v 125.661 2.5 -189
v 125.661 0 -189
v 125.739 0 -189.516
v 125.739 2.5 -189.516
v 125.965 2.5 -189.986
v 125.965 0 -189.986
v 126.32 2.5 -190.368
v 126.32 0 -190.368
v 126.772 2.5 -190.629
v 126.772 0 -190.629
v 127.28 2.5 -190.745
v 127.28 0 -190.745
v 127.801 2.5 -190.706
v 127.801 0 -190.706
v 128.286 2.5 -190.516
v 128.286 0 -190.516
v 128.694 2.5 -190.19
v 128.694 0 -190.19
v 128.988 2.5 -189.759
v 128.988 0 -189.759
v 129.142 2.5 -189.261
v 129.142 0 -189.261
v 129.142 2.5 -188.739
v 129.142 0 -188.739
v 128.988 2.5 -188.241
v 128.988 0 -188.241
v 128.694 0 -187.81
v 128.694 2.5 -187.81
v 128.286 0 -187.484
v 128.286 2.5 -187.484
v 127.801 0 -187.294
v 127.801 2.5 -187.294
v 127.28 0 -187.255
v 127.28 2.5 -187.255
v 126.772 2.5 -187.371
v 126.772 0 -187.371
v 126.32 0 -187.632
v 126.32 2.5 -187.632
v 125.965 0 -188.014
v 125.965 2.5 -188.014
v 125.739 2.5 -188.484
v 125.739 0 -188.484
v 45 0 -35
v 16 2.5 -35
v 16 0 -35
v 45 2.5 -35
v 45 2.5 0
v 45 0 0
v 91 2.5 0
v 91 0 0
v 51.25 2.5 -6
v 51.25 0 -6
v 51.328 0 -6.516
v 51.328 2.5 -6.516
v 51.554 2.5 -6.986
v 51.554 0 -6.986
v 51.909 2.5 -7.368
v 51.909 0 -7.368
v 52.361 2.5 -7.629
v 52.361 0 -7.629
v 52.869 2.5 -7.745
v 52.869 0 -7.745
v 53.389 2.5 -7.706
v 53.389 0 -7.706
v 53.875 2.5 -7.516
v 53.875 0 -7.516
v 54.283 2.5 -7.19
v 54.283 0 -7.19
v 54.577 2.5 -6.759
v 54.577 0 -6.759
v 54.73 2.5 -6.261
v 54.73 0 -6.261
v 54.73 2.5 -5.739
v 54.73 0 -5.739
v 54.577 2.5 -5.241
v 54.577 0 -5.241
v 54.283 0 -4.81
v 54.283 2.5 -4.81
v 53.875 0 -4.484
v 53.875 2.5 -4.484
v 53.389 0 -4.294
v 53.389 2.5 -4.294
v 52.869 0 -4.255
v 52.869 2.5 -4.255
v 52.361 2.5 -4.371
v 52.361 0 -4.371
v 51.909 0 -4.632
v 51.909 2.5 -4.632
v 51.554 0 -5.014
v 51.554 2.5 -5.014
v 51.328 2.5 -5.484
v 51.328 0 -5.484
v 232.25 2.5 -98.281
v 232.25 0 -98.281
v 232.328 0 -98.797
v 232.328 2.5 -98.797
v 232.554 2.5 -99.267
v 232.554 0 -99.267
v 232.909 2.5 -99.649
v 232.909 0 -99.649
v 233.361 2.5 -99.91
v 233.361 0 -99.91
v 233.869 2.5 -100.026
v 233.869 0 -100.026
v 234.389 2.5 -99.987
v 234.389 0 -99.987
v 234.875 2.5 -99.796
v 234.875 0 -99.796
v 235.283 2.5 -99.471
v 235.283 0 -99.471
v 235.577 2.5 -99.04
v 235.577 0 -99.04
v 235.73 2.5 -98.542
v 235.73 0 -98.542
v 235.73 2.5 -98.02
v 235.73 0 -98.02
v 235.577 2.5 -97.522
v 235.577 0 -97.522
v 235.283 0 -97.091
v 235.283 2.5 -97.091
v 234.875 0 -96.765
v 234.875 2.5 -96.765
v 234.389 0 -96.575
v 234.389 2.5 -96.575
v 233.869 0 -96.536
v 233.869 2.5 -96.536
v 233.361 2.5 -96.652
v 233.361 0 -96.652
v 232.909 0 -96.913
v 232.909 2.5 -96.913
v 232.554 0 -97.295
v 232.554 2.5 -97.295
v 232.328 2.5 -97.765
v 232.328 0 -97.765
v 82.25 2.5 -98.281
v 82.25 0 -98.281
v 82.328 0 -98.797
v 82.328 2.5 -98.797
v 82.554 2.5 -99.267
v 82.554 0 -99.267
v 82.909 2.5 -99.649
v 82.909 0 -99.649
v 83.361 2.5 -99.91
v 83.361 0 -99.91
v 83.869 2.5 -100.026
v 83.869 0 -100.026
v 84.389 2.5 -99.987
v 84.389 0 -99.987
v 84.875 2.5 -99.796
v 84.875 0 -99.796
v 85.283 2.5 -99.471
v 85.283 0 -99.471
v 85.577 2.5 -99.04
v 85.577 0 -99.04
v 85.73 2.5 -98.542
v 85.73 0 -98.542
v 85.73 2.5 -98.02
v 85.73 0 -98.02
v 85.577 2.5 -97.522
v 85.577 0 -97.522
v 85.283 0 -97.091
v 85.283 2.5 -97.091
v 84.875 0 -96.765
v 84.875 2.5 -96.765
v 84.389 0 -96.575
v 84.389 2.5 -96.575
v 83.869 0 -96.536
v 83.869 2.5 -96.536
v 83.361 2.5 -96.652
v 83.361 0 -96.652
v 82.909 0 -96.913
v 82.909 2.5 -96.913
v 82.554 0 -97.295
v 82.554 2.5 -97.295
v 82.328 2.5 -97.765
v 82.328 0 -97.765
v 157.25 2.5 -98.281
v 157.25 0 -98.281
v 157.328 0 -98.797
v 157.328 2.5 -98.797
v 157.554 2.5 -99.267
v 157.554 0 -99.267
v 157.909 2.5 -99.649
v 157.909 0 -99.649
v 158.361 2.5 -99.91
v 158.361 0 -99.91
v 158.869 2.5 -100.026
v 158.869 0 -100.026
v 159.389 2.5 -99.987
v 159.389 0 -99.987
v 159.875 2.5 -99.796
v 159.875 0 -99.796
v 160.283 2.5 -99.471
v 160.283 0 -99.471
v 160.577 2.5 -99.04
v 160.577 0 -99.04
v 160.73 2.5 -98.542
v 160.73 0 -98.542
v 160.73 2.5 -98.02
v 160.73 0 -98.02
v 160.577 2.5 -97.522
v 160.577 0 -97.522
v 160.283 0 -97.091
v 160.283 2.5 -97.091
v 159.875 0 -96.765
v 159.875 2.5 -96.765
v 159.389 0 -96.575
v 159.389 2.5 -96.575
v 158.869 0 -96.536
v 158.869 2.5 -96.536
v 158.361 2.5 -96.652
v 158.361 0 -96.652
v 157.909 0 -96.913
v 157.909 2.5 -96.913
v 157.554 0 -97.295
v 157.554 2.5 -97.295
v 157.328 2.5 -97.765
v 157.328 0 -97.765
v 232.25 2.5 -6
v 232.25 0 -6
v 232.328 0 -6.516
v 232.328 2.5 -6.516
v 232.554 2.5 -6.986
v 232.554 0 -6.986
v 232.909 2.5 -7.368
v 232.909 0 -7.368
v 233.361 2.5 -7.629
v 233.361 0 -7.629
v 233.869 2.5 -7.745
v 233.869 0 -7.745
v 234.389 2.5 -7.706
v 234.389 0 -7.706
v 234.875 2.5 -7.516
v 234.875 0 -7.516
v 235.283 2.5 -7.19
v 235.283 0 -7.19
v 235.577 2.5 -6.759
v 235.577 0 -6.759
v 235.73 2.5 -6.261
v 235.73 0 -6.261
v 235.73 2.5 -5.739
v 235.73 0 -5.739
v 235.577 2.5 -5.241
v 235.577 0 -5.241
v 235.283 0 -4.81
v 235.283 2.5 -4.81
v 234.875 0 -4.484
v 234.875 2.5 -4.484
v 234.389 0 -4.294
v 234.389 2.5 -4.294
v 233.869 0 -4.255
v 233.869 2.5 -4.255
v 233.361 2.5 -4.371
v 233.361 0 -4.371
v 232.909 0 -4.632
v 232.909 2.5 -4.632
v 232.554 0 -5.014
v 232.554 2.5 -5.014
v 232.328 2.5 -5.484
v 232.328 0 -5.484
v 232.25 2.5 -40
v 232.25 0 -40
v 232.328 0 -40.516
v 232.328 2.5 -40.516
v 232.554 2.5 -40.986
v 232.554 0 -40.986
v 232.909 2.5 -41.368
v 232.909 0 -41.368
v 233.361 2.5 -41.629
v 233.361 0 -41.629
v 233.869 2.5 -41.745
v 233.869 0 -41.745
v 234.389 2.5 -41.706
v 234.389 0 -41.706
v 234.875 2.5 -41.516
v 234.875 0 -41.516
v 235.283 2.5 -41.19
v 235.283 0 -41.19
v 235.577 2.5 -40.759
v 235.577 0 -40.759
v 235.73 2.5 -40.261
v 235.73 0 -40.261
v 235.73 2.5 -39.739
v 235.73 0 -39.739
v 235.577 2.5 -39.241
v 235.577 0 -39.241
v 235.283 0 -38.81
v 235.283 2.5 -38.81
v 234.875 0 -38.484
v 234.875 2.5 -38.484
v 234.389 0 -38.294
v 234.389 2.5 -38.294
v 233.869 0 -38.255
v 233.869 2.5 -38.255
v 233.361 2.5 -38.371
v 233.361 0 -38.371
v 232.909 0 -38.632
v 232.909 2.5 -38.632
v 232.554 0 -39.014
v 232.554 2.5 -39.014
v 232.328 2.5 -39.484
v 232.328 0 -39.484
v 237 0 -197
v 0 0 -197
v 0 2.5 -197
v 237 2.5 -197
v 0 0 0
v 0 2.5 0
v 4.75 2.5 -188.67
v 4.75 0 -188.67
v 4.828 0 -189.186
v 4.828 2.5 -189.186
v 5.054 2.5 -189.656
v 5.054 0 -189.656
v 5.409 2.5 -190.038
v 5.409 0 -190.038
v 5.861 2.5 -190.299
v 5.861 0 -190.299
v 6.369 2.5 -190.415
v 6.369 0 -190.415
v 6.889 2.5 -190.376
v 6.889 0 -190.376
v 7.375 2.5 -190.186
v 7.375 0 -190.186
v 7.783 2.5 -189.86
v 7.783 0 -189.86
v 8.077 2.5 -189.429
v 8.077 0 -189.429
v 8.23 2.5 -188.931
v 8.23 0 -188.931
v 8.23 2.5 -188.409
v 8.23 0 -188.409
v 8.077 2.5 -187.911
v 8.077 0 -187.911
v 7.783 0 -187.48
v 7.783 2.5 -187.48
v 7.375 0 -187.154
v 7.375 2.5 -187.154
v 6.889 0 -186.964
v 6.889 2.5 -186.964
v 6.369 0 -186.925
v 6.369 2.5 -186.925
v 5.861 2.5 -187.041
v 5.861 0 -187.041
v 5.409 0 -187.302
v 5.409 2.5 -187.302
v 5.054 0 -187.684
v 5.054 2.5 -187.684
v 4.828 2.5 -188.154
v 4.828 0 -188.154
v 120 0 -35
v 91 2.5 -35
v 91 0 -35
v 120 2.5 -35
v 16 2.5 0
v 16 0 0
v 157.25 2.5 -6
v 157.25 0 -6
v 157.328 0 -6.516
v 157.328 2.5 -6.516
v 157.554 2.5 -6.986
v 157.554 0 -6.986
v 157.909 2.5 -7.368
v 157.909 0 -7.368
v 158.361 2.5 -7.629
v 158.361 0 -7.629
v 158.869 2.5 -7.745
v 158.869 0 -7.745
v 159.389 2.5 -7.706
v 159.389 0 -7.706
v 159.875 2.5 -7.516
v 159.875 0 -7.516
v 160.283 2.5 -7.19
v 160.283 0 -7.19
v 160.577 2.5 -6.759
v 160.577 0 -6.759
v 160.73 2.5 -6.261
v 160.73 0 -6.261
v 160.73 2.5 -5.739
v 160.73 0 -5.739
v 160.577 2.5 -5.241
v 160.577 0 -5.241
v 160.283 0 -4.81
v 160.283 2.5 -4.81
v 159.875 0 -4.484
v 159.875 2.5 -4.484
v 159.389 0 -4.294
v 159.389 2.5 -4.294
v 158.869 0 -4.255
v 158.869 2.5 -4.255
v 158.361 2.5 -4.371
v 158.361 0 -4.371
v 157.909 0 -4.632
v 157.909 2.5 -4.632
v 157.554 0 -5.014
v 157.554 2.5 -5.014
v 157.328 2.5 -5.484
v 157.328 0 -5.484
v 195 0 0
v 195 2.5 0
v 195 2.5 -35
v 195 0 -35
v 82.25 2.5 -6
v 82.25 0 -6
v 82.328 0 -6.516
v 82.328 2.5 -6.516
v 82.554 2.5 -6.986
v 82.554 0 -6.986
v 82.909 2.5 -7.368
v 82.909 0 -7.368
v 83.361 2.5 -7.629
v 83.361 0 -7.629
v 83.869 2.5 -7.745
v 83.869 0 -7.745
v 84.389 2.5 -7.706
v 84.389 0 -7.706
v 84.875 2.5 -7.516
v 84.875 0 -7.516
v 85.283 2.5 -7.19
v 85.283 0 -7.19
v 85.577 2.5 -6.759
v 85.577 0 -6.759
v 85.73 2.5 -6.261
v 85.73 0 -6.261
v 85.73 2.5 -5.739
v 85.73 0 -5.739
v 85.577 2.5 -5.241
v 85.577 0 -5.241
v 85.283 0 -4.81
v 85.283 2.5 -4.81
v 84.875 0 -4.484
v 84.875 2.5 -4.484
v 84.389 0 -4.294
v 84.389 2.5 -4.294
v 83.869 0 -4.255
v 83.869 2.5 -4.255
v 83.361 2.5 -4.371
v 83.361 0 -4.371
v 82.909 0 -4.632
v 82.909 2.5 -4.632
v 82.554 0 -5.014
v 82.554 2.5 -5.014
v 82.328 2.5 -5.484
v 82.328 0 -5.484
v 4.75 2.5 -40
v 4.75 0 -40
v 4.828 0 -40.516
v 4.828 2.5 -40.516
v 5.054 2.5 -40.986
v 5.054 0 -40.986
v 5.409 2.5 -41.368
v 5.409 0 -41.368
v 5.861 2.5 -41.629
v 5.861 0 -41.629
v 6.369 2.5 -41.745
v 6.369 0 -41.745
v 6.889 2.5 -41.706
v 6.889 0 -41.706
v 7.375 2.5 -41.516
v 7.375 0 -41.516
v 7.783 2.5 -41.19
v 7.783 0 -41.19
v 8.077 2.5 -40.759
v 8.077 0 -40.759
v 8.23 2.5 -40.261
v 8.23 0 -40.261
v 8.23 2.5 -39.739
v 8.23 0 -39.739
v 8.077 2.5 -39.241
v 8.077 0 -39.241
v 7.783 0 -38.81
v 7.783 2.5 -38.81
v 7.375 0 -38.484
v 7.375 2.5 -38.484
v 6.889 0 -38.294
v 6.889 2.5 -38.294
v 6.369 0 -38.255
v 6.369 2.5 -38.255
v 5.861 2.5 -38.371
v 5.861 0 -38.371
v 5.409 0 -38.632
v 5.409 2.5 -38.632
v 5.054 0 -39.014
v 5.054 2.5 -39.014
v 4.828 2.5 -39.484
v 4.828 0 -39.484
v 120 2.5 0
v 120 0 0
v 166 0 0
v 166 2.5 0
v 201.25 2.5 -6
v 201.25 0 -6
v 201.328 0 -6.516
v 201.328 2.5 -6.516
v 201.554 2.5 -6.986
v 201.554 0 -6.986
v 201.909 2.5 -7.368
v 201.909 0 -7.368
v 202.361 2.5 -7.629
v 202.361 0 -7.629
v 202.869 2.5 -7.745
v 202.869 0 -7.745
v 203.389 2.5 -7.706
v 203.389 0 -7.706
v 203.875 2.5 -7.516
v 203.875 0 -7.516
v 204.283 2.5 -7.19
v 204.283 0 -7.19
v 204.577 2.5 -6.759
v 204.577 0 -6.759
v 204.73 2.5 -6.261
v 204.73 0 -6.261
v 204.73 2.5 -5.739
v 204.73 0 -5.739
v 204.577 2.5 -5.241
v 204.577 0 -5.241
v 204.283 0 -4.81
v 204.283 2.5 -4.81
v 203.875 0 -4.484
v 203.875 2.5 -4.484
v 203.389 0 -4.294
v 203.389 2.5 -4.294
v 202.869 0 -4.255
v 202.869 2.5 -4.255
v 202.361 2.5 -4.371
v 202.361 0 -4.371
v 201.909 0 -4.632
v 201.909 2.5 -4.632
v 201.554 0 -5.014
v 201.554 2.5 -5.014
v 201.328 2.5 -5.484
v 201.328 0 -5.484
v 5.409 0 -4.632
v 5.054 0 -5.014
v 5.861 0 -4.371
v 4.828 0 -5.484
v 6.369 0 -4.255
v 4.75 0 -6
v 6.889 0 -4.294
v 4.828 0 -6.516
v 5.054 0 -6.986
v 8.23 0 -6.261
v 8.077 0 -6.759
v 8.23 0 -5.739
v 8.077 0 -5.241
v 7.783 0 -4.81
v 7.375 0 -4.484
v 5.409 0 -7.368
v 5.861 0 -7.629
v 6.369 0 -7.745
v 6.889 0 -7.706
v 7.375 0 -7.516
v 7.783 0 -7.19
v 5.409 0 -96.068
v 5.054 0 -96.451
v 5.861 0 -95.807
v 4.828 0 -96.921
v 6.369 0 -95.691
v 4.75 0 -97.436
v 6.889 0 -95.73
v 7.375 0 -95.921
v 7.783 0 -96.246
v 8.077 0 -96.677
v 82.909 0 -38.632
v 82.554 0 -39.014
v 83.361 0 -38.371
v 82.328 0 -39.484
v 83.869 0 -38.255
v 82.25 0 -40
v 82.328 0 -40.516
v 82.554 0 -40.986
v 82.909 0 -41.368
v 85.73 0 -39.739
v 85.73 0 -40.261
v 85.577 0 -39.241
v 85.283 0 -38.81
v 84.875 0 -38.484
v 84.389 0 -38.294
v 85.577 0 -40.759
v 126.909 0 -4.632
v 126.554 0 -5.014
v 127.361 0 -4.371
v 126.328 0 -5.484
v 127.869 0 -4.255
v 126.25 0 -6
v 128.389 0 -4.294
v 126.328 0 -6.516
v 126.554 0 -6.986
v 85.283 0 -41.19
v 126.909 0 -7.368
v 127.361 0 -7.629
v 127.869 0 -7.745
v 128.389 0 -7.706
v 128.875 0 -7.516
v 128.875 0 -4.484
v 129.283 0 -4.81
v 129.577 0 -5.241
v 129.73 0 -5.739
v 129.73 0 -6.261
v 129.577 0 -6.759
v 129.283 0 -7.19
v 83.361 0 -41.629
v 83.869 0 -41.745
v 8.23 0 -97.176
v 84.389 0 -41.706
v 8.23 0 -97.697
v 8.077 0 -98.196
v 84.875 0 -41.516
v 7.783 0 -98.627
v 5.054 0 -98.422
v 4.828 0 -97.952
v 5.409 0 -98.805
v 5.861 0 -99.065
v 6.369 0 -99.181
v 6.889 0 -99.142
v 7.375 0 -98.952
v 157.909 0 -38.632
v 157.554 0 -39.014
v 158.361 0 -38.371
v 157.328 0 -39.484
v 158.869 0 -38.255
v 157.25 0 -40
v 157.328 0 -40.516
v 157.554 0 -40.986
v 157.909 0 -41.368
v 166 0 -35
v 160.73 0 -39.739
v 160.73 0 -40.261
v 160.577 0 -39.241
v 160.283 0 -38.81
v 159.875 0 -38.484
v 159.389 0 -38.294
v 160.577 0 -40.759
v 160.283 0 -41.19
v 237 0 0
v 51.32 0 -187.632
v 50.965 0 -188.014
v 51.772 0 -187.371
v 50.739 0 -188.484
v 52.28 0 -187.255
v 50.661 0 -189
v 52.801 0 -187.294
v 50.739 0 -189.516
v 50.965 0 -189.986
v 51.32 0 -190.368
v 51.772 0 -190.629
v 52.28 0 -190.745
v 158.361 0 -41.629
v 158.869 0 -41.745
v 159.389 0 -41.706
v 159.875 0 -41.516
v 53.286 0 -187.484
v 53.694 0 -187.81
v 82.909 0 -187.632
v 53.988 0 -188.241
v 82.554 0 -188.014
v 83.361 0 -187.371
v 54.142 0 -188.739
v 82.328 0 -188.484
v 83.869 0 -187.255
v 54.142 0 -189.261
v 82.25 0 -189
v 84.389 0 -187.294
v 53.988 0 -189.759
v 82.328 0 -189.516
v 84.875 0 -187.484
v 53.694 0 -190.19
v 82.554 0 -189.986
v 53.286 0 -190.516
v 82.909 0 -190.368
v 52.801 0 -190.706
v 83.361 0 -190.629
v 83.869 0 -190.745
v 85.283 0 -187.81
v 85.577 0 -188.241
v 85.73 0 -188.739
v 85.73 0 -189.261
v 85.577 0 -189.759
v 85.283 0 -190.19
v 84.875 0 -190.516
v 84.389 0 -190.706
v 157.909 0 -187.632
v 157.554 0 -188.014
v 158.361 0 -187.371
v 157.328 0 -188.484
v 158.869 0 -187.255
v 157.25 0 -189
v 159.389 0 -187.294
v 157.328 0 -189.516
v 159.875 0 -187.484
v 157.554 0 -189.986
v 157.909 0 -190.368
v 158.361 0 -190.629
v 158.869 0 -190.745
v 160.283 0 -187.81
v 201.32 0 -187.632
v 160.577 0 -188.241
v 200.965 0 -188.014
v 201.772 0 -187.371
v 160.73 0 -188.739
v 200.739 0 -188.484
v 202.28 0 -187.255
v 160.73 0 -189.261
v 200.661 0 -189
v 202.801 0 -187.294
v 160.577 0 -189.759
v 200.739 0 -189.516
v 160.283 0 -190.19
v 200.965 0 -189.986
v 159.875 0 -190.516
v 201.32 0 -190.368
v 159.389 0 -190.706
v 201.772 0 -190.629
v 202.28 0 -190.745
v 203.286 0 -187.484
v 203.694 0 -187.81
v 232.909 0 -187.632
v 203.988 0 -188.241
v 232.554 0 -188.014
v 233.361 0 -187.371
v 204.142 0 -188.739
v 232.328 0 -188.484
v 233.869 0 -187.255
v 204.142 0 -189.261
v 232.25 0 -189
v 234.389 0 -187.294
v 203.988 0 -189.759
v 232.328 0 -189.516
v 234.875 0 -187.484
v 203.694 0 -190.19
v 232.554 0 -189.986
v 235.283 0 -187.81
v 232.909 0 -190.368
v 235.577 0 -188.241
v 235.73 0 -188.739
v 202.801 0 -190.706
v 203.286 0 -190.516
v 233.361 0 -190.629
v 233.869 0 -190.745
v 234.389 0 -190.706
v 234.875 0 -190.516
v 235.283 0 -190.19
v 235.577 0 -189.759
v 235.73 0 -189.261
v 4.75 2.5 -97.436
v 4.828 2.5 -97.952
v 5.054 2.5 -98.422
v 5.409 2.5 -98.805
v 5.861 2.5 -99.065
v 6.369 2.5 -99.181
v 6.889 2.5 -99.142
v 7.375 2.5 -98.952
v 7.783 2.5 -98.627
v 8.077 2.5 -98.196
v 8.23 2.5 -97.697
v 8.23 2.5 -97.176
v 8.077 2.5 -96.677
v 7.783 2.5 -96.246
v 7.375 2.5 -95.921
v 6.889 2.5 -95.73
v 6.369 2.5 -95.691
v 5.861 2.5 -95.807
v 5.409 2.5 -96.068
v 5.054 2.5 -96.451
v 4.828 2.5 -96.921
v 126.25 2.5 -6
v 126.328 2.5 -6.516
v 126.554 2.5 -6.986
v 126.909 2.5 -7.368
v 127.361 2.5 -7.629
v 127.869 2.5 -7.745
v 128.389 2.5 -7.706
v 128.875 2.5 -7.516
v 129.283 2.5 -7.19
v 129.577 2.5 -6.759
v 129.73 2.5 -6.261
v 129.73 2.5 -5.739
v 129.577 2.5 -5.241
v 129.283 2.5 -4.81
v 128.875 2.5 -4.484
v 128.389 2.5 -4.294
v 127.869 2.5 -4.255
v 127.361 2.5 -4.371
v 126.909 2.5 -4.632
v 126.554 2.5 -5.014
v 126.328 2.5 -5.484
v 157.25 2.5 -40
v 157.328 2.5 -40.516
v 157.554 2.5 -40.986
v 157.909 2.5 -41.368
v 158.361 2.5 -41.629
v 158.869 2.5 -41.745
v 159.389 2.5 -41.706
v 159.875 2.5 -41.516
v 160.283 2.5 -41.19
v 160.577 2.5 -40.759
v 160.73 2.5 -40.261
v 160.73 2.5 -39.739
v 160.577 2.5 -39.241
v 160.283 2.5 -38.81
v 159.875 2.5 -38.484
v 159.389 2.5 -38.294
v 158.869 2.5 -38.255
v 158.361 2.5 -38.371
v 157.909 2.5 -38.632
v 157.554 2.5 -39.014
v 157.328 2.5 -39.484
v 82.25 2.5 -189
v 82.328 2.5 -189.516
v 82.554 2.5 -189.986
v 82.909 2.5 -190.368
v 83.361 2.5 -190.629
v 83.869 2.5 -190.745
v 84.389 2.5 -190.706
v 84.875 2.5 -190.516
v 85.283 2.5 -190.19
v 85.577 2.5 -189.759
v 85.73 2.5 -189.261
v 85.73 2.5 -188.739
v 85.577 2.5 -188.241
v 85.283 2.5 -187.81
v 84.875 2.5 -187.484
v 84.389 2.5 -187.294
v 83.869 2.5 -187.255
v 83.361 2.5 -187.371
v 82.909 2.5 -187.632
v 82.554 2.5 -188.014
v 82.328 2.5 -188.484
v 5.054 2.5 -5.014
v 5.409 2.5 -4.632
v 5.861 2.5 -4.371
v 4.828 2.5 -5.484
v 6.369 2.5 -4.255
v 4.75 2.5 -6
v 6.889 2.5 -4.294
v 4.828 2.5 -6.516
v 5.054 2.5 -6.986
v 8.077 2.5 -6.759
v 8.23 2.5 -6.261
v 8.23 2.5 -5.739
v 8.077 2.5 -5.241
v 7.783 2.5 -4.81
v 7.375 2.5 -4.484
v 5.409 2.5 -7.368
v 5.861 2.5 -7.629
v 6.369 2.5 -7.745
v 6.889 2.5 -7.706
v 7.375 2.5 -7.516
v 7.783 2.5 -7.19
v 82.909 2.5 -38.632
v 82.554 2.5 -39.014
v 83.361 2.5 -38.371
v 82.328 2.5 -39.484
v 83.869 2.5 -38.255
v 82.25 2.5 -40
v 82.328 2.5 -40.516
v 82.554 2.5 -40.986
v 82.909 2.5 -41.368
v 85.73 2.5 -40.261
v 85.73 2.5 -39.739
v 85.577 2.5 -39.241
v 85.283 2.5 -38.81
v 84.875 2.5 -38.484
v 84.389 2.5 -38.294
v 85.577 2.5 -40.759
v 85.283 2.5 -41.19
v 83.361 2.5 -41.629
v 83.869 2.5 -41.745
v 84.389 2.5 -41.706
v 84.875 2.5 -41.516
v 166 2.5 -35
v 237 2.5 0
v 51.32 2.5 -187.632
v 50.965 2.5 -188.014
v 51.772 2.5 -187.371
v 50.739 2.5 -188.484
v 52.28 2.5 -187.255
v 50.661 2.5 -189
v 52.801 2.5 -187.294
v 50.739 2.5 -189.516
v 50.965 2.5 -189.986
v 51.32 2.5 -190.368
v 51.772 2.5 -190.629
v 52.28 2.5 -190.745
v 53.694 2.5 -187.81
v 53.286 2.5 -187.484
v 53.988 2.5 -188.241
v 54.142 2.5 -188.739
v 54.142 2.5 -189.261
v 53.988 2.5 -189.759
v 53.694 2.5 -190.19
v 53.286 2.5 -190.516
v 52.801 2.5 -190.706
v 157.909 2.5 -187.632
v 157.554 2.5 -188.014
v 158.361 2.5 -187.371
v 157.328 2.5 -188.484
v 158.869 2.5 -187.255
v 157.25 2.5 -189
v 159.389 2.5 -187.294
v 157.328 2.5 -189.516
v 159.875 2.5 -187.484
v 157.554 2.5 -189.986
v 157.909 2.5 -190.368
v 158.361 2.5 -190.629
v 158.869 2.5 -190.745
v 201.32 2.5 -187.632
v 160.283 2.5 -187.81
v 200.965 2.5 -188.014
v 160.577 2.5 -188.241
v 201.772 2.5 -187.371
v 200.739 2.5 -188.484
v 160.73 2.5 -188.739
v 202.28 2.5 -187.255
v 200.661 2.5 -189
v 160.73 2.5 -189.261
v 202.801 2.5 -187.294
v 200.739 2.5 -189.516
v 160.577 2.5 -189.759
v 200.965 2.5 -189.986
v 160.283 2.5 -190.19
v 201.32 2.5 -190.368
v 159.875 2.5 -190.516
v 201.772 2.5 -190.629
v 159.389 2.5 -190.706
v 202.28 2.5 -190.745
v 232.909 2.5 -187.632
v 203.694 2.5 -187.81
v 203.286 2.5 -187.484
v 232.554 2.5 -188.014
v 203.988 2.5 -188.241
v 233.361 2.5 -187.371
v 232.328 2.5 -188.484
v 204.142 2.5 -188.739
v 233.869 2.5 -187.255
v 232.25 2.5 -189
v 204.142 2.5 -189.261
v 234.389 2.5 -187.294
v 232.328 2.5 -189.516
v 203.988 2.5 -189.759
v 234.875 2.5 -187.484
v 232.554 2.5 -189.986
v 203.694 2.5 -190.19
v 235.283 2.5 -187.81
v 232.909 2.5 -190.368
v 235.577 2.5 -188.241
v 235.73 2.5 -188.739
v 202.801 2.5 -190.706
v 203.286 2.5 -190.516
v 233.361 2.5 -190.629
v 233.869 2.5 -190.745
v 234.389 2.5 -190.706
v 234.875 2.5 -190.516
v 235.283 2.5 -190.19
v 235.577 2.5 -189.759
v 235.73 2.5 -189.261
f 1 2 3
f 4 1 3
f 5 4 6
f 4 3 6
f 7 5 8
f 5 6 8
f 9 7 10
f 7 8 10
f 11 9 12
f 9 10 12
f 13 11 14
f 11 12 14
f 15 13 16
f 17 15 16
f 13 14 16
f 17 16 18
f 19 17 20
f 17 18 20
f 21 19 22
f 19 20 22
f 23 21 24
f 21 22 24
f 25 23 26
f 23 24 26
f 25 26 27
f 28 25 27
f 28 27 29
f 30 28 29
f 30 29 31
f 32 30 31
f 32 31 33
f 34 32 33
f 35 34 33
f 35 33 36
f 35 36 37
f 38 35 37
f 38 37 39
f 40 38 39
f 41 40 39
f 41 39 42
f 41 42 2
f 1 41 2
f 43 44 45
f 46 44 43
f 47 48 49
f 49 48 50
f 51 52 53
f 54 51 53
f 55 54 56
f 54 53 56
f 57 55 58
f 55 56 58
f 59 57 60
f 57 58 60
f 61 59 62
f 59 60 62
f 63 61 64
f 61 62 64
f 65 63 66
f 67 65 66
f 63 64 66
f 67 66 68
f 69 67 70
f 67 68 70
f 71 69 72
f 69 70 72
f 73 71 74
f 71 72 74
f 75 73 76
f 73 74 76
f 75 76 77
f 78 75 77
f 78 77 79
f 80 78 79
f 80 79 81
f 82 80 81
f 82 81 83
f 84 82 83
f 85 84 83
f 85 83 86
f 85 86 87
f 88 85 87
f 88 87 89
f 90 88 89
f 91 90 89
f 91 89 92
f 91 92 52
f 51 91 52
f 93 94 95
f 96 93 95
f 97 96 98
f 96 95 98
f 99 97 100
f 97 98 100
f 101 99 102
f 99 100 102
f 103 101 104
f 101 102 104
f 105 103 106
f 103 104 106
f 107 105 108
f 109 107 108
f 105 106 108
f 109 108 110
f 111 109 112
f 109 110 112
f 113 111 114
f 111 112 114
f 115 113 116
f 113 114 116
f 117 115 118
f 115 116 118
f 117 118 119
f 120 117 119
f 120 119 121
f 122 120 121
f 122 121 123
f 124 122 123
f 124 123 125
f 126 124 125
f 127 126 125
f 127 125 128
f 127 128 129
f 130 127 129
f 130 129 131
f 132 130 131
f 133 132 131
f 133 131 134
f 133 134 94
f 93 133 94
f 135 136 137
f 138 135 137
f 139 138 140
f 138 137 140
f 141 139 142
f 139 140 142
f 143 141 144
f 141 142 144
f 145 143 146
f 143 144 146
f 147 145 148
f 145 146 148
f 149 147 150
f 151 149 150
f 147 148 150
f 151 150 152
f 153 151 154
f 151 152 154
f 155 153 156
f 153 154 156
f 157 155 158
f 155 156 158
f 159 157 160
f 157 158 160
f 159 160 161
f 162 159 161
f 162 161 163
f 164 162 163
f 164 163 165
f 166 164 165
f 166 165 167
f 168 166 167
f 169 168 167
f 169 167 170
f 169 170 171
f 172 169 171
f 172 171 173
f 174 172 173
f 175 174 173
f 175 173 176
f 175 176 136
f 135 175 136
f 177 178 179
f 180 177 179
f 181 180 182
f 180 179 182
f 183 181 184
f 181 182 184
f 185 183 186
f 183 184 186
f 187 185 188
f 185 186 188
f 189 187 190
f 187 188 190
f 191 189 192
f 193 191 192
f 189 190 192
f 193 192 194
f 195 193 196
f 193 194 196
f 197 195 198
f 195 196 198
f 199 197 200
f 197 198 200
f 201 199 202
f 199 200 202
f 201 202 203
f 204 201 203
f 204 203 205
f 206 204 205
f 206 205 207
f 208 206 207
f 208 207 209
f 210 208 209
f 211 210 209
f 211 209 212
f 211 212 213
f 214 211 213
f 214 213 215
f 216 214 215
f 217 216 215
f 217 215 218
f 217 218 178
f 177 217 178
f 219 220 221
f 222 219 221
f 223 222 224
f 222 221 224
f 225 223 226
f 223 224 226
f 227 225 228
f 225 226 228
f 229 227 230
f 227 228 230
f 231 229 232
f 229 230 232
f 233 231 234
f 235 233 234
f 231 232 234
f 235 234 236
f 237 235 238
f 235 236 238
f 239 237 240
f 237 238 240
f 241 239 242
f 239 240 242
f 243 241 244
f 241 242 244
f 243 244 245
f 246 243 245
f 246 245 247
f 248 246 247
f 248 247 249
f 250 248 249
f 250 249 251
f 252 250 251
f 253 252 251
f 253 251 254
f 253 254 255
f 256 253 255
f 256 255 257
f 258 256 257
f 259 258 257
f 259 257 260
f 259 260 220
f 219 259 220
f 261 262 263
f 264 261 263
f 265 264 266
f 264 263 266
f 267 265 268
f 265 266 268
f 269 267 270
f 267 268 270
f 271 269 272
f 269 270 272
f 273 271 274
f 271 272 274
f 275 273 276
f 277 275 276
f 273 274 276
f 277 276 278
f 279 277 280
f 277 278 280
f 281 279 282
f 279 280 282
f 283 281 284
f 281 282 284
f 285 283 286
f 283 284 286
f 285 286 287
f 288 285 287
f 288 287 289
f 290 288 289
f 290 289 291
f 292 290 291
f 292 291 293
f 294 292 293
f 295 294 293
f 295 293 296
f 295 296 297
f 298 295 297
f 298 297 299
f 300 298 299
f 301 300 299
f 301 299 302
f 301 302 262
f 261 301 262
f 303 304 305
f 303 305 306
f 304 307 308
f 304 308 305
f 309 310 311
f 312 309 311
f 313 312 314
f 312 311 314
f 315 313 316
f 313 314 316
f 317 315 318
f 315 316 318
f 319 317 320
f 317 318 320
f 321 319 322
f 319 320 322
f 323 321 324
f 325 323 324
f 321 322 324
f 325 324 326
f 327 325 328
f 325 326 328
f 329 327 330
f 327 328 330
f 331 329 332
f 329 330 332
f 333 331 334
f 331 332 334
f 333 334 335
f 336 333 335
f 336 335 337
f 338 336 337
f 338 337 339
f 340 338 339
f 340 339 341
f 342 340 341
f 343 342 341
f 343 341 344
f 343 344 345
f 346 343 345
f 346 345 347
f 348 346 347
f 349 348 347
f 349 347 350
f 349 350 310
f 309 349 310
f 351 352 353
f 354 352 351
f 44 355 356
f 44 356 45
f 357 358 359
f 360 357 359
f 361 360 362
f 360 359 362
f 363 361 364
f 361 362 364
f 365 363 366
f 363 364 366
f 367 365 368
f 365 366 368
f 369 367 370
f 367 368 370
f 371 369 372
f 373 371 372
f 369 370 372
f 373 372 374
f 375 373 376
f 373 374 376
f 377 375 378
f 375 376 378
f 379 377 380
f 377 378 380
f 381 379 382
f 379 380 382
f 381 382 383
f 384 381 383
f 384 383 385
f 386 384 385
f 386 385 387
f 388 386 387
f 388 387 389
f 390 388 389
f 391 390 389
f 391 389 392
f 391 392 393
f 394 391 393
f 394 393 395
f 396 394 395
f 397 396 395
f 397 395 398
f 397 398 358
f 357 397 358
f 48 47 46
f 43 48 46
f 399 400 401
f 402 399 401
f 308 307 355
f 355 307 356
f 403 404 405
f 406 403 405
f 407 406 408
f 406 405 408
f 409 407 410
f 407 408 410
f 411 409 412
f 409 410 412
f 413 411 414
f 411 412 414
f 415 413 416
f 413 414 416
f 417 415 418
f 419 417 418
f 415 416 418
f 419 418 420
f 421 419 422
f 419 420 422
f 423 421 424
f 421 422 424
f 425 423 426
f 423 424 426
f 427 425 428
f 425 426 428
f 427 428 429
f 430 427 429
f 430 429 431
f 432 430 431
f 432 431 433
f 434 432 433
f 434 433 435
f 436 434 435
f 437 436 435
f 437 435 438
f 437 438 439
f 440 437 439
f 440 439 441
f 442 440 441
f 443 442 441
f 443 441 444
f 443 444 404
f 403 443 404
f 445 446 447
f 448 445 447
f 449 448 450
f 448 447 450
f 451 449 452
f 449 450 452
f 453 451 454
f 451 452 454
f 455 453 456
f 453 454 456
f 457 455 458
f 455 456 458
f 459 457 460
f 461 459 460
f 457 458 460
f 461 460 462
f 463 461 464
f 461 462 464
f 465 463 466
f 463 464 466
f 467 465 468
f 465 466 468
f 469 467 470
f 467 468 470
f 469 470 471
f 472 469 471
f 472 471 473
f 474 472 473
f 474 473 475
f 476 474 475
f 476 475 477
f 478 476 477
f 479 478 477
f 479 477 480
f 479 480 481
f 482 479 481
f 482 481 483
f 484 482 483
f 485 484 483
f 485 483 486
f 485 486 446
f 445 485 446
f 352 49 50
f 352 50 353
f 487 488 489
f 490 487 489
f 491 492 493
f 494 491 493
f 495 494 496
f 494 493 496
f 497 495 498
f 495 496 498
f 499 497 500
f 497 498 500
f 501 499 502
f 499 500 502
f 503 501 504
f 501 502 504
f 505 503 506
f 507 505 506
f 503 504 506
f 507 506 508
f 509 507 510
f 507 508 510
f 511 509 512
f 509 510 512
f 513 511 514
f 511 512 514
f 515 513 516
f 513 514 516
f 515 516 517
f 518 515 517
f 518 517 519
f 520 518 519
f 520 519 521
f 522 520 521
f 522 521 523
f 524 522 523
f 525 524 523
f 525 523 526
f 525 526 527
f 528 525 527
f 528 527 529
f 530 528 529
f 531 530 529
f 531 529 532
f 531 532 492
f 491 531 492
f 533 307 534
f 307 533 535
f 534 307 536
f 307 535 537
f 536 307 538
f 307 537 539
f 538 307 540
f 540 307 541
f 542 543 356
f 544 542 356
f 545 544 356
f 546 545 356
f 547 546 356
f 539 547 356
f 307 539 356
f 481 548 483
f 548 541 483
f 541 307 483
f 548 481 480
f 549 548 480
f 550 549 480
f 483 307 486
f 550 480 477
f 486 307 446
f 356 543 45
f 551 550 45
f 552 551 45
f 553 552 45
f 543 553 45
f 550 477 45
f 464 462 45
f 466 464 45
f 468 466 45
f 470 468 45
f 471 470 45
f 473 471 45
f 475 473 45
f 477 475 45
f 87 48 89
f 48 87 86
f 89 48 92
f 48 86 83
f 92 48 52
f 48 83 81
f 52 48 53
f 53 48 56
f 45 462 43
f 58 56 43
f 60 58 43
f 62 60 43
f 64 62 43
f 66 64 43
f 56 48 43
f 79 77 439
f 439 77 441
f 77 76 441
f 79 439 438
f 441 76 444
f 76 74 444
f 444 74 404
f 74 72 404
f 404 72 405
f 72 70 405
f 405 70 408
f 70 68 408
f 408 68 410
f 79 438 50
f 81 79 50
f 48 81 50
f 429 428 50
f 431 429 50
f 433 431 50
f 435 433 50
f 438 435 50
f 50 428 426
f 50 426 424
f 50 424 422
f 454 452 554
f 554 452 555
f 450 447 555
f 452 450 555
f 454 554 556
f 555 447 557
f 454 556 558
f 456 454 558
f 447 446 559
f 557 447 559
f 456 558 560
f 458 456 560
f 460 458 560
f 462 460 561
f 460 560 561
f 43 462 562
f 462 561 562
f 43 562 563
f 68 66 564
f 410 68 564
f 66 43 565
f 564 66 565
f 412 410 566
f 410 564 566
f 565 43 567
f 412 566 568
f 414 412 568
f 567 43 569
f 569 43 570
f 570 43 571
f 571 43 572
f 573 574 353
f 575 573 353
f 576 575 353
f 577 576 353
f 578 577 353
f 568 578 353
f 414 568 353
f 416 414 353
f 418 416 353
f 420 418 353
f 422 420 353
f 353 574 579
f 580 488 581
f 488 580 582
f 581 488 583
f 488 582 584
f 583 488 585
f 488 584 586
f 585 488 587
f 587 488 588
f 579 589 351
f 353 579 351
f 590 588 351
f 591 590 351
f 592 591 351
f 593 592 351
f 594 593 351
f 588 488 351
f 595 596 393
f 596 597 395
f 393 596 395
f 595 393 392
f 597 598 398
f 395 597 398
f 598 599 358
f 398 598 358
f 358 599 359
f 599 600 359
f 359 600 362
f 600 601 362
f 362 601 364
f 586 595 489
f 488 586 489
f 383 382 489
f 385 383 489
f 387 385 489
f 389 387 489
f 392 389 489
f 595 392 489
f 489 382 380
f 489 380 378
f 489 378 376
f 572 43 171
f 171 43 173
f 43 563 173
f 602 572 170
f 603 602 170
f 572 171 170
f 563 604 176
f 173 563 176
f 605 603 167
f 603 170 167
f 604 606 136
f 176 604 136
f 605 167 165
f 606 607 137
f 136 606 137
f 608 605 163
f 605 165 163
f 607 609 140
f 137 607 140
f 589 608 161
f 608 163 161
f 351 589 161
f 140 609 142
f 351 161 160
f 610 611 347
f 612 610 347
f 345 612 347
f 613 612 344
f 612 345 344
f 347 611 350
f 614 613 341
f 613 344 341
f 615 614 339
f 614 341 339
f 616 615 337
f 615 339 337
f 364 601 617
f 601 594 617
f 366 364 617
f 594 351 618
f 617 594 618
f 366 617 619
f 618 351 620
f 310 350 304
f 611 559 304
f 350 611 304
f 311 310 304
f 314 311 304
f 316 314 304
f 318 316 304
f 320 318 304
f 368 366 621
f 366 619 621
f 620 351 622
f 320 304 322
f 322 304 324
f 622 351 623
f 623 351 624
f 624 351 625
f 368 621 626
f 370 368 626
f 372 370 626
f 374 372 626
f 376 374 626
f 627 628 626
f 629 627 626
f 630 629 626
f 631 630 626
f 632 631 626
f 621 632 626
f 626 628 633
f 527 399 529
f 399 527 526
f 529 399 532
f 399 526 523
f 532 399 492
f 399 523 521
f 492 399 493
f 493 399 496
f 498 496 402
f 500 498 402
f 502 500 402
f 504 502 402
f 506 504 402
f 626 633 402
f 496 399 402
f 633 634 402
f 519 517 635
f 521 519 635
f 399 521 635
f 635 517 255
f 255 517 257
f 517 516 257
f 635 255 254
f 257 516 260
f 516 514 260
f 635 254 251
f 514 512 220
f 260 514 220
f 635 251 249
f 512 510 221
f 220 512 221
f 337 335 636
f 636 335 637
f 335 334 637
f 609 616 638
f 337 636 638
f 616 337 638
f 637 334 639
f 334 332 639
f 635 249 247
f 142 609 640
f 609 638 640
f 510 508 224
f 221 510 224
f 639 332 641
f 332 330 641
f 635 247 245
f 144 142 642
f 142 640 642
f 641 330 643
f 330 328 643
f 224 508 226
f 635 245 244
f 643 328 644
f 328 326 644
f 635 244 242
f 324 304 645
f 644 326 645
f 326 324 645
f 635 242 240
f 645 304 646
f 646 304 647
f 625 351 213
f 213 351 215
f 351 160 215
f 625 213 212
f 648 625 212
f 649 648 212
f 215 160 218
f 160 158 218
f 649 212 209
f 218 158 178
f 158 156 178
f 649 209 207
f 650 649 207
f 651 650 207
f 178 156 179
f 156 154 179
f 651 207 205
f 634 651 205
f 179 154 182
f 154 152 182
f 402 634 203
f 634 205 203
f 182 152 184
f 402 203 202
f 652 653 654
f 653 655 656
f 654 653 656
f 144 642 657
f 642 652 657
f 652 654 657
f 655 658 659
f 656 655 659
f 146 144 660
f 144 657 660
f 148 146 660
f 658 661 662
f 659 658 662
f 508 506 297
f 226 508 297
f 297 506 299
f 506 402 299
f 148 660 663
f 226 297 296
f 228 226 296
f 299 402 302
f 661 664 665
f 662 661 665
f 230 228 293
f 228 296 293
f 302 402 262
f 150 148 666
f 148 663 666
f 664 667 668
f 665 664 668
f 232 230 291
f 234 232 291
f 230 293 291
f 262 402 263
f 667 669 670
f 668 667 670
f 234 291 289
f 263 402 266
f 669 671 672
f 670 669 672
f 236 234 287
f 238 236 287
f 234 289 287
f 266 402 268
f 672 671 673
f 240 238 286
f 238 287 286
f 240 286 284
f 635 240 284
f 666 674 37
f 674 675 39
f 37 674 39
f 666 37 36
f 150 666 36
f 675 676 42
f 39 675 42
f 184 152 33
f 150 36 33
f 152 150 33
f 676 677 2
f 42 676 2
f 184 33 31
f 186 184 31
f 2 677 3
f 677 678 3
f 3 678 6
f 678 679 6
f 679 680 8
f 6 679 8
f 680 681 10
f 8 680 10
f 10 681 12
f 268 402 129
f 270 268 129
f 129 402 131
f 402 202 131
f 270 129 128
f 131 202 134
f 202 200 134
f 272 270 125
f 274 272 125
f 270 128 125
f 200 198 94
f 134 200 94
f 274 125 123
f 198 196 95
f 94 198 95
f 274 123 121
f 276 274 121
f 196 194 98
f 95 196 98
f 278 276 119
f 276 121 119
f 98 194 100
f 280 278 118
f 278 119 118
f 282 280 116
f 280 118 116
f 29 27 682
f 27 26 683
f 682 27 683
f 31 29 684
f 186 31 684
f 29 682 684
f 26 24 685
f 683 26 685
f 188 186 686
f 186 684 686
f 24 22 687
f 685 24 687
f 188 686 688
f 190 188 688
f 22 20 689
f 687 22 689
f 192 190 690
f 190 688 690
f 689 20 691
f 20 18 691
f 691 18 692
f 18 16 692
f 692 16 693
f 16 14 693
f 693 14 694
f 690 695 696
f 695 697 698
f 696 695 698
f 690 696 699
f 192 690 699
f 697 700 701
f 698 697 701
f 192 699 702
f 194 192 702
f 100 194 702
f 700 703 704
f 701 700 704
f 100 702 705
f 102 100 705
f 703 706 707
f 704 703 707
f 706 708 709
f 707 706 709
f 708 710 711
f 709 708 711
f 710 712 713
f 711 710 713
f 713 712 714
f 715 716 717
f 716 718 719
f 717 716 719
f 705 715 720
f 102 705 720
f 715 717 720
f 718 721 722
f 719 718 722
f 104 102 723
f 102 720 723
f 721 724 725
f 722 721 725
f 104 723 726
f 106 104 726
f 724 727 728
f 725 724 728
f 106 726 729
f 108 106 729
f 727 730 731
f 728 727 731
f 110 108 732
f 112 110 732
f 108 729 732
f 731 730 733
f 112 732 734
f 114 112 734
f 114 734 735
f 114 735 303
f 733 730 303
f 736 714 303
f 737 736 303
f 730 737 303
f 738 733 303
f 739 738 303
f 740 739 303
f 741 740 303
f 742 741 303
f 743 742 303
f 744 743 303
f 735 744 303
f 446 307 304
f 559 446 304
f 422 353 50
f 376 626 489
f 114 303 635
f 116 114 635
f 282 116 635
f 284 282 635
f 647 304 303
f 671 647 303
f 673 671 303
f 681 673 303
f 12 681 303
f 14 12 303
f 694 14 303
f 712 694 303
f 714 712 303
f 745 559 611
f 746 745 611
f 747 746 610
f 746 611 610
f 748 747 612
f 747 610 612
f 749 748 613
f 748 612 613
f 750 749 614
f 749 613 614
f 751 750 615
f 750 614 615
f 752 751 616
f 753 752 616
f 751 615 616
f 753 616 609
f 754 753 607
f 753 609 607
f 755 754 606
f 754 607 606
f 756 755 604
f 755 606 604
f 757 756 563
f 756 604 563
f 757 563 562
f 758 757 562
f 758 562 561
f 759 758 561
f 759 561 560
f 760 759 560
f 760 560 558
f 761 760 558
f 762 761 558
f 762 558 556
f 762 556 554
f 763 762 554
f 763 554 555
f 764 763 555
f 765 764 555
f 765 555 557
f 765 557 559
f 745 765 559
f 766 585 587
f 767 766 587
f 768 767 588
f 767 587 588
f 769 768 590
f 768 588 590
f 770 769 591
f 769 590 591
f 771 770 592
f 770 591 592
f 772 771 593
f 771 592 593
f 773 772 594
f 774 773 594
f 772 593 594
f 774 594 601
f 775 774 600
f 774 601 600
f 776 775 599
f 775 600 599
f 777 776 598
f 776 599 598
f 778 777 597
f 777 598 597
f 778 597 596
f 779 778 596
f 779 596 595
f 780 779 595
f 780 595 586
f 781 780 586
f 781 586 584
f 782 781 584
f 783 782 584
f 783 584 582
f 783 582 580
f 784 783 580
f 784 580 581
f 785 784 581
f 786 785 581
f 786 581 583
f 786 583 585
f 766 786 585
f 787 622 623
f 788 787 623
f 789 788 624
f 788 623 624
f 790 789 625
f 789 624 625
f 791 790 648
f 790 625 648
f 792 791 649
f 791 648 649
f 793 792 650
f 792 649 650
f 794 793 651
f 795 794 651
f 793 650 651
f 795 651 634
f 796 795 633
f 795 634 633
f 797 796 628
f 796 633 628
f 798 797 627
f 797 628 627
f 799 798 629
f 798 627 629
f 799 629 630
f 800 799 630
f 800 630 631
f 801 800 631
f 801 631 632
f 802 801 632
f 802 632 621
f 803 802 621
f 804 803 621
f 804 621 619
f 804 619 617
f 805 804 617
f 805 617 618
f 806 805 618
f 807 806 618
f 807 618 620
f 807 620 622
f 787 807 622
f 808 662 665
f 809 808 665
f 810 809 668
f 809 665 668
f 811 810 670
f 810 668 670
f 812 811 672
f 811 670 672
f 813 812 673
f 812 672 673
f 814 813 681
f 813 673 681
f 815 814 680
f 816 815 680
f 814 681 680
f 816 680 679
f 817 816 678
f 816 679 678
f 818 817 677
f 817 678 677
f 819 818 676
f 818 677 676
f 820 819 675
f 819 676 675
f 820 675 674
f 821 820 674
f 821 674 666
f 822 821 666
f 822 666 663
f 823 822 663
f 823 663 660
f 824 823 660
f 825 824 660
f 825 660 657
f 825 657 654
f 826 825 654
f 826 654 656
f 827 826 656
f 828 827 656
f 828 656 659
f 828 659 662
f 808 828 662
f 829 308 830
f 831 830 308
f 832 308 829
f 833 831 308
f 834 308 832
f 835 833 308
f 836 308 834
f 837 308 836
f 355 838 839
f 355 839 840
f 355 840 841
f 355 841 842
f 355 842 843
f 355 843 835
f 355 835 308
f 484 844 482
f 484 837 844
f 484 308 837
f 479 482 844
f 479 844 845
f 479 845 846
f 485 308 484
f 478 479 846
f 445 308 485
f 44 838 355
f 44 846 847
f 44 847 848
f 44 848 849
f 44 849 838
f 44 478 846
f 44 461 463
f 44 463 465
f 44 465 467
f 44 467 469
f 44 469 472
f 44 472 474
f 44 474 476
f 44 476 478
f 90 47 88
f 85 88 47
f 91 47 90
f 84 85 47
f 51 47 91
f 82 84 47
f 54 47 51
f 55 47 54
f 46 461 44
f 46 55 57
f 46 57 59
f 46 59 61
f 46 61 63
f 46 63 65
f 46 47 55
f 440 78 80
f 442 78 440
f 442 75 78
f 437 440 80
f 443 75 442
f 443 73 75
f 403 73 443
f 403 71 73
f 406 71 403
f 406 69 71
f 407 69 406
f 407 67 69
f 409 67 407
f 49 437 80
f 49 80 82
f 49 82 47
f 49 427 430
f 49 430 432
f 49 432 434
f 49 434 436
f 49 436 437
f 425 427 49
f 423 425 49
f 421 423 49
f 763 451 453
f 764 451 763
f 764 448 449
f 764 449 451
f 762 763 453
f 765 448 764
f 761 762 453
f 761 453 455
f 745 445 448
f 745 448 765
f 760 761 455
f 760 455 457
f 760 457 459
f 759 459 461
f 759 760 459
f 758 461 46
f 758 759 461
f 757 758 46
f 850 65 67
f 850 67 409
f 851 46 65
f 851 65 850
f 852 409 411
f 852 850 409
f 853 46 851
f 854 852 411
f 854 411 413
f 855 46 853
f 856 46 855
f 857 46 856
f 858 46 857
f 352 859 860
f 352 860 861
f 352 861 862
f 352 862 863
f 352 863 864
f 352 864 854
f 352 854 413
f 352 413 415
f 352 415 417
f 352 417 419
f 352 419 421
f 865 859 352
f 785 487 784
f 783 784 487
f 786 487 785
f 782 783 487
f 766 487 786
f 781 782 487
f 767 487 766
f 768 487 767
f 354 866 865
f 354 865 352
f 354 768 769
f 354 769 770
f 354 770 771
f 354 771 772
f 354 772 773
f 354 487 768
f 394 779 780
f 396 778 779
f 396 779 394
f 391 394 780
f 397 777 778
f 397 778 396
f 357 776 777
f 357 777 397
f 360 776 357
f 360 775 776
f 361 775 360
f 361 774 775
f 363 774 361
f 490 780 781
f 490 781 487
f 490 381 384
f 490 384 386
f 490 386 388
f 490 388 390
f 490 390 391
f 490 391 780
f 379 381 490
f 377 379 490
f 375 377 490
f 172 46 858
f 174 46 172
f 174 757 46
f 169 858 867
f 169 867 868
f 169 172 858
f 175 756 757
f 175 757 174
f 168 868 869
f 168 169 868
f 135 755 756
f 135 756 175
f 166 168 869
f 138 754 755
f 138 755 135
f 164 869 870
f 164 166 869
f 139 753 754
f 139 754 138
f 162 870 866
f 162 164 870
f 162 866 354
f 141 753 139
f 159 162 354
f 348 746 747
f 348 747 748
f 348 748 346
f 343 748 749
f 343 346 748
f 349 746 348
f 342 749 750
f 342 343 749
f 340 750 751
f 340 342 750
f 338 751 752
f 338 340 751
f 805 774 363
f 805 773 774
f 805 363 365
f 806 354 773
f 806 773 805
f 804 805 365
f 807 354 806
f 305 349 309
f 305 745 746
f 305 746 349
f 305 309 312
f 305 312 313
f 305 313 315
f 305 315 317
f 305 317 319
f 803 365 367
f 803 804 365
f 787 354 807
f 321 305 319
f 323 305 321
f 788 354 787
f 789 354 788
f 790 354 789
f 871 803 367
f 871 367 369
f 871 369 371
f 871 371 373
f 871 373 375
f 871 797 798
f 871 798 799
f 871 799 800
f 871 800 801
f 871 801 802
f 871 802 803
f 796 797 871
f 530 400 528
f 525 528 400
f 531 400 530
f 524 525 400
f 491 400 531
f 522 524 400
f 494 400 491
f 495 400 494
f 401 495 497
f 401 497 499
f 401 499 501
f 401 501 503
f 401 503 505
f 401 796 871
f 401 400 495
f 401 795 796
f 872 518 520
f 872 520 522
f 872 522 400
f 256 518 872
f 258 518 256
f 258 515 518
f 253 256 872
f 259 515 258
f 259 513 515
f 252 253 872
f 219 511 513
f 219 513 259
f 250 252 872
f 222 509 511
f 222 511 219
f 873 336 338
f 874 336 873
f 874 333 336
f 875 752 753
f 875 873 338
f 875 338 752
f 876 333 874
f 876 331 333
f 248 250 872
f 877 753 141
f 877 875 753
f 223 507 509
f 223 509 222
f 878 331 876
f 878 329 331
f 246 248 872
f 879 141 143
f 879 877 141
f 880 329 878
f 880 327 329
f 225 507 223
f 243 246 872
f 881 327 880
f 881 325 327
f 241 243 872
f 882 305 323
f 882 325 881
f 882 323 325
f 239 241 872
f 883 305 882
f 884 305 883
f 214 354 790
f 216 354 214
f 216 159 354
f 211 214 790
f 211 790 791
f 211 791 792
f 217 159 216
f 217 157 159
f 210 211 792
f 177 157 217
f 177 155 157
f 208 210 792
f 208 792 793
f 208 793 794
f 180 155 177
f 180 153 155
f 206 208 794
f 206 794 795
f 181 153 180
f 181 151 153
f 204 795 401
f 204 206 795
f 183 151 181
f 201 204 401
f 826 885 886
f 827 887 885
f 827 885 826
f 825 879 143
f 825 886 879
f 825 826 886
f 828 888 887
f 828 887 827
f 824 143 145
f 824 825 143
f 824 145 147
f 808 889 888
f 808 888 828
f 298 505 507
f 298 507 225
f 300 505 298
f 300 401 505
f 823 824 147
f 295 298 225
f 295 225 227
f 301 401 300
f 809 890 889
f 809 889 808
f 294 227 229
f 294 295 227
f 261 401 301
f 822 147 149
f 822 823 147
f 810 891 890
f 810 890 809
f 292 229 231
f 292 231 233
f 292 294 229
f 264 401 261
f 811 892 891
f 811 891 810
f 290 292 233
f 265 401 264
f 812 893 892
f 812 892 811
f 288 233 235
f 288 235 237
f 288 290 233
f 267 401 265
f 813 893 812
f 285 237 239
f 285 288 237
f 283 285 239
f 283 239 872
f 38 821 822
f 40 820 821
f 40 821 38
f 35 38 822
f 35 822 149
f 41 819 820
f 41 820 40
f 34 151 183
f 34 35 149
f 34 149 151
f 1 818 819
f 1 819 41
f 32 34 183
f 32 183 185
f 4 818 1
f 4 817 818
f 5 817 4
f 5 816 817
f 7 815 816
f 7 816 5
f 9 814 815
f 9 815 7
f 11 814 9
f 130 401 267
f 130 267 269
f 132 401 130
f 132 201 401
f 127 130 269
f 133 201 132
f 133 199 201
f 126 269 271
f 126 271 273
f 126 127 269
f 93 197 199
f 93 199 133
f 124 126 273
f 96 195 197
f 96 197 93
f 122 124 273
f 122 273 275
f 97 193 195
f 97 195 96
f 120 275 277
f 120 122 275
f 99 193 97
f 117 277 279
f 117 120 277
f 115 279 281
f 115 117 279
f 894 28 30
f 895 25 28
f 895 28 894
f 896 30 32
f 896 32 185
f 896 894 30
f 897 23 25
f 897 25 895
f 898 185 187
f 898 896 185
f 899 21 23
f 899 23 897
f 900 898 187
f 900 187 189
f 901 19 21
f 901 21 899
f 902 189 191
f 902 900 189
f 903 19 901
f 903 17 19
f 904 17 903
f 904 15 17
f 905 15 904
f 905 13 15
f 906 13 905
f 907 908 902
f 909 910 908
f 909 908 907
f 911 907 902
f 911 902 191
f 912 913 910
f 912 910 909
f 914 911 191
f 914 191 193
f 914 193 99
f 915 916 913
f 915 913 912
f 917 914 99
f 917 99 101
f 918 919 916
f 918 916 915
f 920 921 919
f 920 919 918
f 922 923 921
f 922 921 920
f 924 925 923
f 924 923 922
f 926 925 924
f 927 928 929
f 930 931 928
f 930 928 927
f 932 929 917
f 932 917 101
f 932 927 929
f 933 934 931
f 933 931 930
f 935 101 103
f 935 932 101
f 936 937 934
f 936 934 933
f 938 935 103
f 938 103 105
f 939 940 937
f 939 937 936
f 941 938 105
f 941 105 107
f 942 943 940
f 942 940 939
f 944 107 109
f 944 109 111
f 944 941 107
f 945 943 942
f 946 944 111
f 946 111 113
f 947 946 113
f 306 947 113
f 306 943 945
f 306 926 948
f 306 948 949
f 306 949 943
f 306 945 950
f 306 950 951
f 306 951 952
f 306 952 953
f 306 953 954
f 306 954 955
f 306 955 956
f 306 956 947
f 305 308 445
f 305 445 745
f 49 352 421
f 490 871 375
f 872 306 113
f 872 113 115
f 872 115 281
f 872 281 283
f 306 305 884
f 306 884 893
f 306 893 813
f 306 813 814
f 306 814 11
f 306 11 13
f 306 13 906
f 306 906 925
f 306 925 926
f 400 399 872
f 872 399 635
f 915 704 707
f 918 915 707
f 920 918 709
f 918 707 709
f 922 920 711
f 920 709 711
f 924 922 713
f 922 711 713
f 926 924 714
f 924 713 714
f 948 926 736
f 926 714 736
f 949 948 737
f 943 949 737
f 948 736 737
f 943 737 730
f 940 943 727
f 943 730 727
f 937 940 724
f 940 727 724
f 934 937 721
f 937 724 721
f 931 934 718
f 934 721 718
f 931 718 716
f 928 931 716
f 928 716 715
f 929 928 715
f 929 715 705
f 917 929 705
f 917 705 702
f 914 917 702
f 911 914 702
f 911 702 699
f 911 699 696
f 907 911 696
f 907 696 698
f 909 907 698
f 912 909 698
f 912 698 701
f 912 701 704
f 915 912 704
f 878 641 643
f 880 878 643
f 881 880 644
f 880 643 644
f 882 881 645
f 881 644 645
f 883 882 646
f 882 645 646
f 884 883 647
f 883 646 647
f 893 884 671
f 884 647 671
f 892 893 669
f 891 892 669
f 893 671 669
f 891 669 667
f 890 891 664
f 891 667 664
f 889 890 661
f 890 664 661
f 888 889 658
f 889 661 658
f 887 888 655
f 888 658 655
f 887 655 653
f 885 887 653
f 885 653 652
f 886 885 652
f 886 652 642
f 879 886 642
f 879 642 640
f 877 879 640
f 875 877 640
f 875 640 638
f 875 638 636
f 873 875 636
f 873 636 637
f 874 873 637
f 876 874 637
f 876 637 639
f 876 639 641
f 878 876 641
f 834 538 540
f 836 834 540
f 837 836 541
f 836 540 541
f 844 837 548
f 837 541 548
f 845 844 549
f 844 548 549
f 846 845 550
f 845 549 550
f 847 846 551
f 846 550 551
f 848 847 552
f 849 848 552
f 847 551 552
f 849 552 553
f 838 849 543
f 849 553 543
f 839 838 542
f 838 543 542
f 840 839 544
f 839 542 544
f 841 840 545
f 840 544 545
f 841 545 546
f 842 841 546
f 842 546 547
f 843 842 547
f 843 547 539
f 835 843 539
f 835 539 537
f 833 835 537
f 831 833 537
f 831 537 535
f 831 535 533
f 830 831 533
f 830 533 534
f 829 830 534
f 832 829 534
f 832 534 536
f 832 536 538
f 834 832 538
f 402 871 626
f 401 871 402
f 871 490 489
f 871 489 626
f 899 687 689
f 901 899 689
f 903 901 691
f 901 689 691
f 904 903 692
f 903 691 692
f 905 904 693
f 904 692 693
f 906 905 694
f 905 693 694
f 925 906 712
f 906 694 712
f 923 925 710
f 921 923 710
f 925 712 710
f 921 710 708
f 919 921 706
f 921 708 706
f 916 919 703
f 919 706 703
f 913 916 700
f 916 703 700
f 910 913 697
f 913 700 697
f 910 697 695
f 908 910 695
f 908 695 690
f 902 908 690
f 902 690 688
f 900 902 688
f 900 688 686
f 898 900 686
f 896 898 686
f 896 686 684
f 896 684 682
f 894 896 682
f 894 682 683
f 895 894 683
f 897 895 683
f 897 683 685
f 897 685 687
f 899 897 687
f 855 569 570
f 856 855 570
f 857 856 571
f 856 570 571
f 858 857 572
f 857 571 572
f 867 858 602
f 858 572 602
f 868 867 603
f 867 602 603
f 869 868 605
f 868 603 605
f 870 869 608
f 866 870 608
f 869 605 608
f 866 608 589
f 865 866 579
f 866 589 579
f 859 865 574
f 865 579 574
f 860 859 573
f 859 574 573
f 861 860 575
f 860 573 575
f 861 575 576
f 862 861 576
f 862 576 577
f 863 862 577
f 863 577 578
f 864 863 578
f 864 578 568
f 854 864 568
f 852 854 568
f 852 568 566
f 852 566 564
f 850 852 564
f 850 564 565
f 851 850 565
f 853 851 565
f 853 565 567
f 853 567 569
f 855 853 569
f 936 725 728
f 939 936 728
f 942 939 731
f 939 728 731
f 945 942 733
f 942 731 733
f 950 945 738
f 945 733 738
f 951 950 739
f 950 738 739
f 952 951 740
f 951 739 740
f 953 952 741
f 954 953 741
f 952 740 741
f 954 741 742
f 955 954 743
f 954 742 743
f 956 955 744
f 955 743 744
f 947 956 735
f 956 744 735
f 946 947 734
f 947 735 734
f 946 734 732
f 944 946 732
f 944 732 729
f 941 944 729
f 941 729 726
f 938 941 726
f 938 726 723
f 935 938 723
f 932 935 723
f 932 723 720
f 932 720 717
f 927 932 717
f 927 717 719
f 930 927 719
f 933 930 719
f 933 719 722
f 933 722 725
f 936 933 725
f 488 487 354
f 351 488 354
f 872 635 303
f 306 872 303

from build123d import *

# Parameters (mm, degrees)
SZKIC1_W                       = 237
SZKIC1_H                       = 197
DODANIE_WYCI_GNI_CIE1_DEPTH    = 2.5
SZKIC2_W                       = 29
SZKIC2_H                       = 35
WYTNIJ_WYCI_GNI_CIE1_DEPTH     = 3
SZYK_LINIOWY1_COUNT            = 3
SZYK_LINIOWY1_PITCH            = 75
OTWORY_USTALAJ_CE_4_0MM1_D     = 3.5
OTWORY_USTALAJ_CE_4_0MM1_DEPTH = 10


with BuildPart() as part:
    # Szkic1 → Dodanie-wyciągnięcie1 (new body)
    with BuildSketch(Plane(origin=(0, 0, 0), x_dir=(1, 0, 0), z_dir=(0, 1, 0))):
        with Locations((118.5, 98.5)):
            Rectangle(SZKIC1_W, SZKIC1_H)
    extrude(amount=DODANIE_WYCI_GNI_CIE1_DEPTH)

    # Szkic2 → Wytnij-wyciągnięcie1 (cut)
    with BuildSketch(Plane(origin=(0, 2.5, 0), x_dir=(1, 0, 0), z_dir=(0, 1, 0))):
        with Locations((30.5, 17.5)):
            Rectangle(SZKIC2_W, SZKIC2_H)
    wytnij_wyci_gni_cie1 = extrude(amount=-WYTNIJ_WYCI_GNI_CIE1_DEPTH, mode=Mode.SUBTRACT)

    # Szyk liniowy1: Wytnij-wyciągnięcie1 ×3
    with Locations(*[(i * SZYK_LINIOWY1_PITCH, 0, 0) for i in range(1, SZYK_LINIOWY1_COUNT)]):
        add(wytnij_wyci_gni_cie1, mode=Mode.SUBTRACT)

    # Otwory ustalające Ø4.0mm1
    with Locations(Plane(origin=(0, 2.5, 0), x_dir=(1, 0, 0), z_dir=(0, 1, 0))):
        with Locations((6.5, 6), (53, 6), (84, 6), (84, 98.280811552), (6.5, 97.43634097), (6.5, 188.669995221), (52.411150371, 189), (84, 189), (127.411150371, 189), (128, 6), (159, 6), (203, 6), (234, 6), (159, 98.280811552), (234, 98.280811552), (234, 189), (202.411150371, 189), (159, 189), (6.5, 40), (84, 40), (159, 40), (234, 40)):
            Hole(OTWORY_USTALAJ_CE_4_0MM1_D / 2, depth=OTWORY_USTALAJ_CE_4_0MM1_DEPTH)


solid = part.part
